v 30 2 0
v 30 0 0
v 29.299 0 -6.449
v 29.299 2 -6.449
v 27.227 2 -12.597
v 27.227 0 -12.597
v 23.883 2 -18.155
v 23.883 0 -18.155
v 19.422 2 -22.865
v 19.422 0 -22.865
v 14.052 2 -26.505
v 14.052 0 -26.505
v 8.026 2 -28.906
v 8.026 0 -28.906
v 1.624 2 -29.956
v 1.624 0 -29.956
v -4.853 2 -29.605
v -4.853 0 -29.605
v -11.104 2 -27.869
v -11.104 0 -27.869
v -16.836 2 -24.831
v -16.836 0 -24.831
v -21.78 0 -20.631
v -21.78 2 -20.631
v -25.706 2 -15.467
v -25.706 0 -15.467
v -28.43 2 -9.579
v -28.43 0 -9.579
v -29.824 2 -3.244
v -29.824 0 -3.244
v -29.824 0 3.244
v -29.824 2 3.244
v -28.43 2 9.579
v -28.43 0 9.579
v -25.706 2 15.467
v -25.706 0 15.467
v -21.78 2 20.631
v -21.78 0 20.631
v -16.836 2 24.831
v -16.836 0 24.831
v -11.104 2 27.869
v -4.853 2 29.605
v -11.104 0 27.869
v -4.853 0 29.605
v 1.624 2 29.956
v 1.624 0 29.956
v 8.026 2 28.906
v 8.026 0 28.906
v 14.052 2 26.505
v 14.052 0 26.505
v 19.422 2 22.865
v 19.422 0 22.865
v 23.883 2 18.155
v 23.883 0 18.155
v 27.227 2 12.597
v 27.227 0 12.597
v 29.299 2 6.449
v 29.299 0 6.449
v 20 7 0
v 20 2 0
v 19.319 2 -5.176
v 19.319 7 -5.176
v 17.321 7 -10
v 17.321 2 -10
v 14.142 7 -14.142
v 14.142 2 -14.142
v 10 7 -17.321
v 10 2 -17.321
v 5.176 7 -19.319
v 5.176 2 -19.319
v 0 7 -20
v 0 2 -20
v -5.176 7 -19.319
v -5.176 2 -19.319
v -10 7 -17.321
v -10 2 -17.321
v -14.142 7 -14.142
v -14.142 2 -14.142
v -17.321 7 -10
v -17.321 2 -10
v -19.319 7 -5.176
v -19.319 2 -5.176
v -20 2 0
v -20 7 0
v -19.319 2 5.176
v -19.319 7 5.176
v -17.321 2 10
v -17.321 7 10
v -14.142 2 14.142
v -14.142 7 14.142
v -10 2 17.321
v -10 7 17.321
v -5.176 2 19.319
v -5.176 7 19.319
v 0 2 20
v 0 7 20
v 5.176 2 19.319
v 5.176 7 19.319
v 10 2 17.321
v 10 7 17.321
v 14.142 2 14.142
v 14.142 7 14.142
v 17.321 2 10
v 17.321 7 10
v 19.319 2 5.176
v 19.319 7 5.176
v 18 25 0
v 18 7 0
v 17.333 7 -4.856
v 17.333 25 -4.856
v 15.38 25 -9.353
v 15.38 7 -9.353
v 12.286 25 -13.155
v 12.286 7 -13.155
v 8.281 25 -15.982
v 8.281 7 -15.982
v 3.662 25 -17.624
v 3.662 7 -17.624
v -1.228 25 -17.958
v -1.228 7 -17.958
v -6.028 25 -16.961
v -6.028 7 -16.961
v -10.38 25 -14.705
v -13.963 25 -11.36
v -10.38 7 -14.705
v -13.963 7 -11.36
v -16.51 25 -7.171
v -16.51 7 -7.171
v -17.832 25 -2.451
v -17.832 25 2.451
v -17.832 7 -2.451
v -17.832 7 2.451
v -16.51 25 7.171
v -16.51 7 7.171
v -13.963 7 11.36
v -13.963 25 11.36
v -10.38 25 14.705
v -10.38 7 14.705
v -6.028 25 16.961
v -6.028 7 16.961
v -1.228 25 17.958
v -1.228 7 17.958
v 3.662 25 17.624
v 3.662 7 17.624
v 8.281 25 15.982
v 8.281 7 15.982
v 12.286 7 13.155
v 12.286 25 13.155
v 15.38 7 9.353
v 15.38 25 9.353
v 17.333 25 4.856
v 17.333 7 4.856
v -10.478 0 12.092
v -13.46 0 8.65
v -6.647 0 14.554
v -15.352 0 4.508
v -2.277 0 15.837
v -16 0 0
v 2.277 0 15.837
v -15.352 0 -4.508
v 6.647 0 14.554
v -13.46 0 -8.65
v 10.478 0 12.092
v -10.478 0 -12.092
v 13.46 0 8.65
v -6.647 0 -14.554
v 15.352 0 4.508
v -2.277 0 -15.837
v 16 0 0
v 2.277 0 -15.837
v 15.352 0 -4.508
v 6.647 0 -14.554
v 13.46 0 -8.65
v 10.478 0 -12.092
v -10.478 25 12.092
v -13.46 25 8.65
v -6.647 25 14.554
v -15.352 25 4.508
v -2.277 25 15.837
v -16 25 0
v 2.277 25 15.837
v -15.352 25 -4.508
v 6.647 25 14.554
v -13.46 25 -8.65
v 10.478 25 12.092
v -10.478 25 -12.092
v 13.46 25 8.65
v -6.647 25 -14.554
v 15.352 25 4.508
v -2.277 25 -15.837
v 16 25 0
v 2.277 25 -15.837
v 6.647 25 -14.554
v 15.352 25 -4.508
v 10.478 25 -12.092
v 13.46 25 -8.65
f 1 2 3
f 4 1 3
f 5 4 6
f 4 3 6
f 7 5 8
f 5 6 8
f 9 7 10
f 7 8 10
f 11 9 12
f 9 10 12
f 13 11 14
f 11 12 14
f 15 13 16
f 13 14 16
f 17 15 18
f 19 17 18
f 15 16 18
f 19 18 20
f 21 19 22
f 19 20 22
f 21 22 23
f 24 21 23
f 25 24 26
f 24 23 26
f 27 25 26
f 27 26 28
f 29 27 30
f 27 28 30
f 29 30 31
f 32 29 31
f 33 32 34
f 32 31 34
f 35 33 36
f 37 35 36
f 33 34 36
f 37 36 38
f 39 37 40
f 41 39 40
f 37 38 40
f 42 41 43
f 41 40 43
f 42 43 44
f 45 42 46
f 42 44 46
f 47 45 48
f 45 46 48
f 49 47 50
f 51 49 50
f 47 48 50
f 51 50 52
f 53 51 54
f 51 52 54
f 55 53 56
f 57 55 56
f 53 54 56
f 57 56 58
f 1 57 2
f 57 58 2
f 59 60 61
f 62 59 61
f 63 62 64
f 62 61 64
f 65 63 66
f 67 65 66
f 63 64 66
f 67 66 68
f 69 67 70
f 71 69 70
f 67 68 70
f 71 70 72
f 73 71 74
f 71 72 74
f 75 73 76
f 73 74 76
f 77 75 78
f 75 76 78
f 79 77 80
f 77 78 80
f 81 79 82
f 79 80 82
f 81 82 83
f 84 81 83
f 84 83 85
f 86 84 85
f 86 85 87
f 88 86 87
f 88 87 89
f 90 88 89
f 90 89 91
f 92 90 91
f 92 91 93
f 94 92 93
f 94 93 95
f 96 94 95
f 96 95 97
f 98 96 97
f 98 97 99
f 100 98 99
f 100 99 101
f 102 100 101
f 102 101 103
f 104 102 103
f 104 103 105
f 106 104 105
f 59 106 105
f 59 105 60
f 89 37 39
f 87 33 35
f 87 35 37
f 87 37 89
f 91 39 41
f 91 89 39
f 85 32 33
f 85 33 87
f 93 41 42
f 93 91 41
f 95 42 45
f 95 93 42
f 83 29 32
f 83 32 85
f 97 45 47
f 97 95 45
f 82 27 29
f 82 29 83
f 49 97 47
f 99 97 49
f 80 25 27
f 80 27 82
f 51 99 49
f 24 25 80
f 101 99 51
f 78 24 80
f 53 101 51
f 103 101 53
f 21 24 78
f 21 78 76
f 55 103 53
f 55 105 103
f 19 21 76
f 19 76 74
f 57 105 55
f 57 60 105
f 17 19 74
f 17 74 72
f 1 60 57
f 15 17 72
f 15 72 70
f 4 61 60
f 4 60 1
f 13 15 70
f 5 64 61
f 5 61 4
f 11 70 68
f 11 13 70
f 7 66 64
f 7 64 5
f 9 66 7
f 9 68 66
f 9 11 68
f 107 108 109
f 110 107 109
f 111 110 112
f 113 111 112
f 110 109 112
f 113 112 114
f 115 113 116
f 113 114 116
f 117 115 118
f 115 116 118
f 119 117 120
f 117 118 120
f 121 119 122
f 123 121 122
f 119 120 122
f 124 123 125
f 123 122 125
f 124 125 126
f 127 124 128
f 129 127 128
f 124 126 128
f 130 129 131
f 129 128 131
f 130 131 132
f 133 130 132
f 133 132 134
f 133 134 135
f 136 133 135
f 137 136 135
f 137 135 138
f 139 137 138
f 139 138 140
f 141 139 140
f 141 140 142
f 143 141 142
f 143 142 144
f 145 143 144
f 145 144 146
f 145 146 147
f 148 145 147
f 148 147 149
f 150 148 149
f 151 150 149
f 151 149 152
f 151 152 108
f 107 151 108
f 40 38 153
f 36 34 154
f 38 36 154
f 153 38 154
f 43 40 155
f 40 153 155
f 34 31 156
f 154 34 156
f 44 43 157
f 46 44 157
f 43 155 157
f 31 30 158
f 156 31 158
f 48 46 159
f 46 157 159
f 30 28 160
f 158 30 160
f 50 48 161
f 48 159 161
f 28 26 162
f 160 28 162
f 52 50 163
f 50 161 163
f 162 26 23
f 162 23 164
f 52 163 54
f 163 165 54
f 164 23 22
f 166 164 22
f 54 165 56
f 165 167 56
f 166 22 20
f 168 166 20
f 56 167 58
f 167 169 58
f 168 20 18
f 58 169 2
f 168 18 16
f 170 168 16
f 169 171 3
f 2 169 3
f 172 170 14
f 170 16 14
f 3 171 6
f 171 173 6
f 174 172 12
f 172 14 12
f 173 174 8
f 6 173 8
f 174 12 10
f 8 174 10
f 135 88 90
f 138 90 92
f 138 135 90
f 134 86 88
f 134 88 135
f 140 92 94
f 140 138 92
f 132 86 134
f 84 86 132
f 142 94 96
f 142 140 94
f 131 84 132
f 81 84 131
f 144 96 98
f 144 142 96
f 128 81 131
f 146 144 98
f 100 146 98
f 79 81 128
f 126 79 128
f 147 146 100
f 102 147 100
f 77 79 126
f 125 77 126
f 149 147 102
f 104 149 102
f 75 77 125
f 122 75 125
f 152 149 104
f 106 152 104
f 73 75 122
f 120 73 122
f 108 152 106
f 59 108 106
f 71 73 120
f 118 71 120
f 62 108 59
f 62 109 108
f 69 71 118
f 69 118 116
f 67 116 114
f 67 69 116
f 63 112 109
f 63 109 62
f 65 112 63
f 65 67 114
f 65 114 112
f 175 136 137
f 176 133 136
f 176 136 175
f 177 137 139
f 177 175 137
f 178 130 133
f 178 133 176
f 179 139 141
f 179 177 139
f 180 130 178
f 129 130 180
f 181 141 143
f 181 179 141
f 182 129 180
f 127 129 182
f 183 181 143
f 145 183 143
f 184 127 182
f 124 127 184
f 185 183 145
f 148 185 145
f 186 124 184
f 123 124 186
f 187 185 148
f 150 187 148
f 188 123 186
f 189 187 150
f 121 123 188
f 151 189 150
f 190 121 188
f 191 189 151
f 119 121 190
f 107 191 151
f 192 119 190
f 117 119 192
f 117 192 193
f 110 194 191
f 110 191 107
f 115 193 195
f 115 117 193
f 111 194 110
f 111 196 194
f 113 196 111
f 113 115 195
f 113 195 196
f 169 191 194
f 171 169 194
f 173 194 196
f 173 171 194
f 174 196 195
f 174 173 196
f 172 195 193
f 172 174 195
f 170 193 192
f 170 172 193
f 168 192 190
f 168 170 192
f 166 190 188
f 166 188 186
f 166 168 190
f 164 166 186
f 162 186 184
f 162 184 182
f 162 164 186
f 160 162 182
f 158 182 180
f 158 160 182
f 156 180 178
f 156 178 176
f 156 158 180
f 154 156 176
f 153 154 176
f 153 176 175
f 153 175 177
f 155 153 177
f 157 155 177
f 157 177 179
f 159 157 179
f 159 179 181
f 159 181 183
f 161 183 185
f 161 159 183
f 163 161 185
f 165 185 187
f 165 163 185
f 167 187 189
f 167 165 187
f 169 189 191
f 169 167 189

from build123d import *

# Parameters (mm, degrees)
SKETCH1_R           = 30
SKETCH1_R_2         = 20
BOSS_EXTRUDE1_DEPTH = 2
SKETCH2_R           = 20
SKETCH2_R_2         = 18
BOSS_EXTRUDE2_DEPTH = 7
SKETCH3_R           = 18
SKETCH3_R_2         = 16
BOSS_EXTRUDE3_DEPTH = 25


with BuildPart() as part:
    # Sketch1 → Boss-Extrude1 (new body)
    with BuildSketch(Plane(origin=(0, 0, 0), x_dir=(1, 0, 0), z_dir=(0, 1, 0))):
        Circle(SKETCH1_R)
        Circle(SKETCH1_R_2, mode=Mode.SUBTRACT)
    extrude(amount=BOSS_EXTRUDE1_DEPTH)

    # Sketch2 → Boss-Extrude2 (add)
    with BuildSketch(Plane(origin=(0, 0, 0), x_dir=(1, 0, 0), z_dir=(0, 1, 0))):
        Circle(SKETCH2_R)
        Circle(SKETCH2_R_2, mode=Mode.SUBTRACT)
    extrude(amount=BOSS_EXTRUDE2_DEPTH)

    # Sketch3 → Boss-Extrude3 (add)
    with BuildSketch(Plane(origin=(0, 0, 0), x_dir=(1, 0, 0), z_dir=(0, 1, 0))):
        Circle(SKETCH3_R)
        Circle(SKETCH3_R_2, mode=Mode.SUBTRACT)
    extrude(amount=BOSS_EXTRUDE3_DEPTH)


solid = part.part
